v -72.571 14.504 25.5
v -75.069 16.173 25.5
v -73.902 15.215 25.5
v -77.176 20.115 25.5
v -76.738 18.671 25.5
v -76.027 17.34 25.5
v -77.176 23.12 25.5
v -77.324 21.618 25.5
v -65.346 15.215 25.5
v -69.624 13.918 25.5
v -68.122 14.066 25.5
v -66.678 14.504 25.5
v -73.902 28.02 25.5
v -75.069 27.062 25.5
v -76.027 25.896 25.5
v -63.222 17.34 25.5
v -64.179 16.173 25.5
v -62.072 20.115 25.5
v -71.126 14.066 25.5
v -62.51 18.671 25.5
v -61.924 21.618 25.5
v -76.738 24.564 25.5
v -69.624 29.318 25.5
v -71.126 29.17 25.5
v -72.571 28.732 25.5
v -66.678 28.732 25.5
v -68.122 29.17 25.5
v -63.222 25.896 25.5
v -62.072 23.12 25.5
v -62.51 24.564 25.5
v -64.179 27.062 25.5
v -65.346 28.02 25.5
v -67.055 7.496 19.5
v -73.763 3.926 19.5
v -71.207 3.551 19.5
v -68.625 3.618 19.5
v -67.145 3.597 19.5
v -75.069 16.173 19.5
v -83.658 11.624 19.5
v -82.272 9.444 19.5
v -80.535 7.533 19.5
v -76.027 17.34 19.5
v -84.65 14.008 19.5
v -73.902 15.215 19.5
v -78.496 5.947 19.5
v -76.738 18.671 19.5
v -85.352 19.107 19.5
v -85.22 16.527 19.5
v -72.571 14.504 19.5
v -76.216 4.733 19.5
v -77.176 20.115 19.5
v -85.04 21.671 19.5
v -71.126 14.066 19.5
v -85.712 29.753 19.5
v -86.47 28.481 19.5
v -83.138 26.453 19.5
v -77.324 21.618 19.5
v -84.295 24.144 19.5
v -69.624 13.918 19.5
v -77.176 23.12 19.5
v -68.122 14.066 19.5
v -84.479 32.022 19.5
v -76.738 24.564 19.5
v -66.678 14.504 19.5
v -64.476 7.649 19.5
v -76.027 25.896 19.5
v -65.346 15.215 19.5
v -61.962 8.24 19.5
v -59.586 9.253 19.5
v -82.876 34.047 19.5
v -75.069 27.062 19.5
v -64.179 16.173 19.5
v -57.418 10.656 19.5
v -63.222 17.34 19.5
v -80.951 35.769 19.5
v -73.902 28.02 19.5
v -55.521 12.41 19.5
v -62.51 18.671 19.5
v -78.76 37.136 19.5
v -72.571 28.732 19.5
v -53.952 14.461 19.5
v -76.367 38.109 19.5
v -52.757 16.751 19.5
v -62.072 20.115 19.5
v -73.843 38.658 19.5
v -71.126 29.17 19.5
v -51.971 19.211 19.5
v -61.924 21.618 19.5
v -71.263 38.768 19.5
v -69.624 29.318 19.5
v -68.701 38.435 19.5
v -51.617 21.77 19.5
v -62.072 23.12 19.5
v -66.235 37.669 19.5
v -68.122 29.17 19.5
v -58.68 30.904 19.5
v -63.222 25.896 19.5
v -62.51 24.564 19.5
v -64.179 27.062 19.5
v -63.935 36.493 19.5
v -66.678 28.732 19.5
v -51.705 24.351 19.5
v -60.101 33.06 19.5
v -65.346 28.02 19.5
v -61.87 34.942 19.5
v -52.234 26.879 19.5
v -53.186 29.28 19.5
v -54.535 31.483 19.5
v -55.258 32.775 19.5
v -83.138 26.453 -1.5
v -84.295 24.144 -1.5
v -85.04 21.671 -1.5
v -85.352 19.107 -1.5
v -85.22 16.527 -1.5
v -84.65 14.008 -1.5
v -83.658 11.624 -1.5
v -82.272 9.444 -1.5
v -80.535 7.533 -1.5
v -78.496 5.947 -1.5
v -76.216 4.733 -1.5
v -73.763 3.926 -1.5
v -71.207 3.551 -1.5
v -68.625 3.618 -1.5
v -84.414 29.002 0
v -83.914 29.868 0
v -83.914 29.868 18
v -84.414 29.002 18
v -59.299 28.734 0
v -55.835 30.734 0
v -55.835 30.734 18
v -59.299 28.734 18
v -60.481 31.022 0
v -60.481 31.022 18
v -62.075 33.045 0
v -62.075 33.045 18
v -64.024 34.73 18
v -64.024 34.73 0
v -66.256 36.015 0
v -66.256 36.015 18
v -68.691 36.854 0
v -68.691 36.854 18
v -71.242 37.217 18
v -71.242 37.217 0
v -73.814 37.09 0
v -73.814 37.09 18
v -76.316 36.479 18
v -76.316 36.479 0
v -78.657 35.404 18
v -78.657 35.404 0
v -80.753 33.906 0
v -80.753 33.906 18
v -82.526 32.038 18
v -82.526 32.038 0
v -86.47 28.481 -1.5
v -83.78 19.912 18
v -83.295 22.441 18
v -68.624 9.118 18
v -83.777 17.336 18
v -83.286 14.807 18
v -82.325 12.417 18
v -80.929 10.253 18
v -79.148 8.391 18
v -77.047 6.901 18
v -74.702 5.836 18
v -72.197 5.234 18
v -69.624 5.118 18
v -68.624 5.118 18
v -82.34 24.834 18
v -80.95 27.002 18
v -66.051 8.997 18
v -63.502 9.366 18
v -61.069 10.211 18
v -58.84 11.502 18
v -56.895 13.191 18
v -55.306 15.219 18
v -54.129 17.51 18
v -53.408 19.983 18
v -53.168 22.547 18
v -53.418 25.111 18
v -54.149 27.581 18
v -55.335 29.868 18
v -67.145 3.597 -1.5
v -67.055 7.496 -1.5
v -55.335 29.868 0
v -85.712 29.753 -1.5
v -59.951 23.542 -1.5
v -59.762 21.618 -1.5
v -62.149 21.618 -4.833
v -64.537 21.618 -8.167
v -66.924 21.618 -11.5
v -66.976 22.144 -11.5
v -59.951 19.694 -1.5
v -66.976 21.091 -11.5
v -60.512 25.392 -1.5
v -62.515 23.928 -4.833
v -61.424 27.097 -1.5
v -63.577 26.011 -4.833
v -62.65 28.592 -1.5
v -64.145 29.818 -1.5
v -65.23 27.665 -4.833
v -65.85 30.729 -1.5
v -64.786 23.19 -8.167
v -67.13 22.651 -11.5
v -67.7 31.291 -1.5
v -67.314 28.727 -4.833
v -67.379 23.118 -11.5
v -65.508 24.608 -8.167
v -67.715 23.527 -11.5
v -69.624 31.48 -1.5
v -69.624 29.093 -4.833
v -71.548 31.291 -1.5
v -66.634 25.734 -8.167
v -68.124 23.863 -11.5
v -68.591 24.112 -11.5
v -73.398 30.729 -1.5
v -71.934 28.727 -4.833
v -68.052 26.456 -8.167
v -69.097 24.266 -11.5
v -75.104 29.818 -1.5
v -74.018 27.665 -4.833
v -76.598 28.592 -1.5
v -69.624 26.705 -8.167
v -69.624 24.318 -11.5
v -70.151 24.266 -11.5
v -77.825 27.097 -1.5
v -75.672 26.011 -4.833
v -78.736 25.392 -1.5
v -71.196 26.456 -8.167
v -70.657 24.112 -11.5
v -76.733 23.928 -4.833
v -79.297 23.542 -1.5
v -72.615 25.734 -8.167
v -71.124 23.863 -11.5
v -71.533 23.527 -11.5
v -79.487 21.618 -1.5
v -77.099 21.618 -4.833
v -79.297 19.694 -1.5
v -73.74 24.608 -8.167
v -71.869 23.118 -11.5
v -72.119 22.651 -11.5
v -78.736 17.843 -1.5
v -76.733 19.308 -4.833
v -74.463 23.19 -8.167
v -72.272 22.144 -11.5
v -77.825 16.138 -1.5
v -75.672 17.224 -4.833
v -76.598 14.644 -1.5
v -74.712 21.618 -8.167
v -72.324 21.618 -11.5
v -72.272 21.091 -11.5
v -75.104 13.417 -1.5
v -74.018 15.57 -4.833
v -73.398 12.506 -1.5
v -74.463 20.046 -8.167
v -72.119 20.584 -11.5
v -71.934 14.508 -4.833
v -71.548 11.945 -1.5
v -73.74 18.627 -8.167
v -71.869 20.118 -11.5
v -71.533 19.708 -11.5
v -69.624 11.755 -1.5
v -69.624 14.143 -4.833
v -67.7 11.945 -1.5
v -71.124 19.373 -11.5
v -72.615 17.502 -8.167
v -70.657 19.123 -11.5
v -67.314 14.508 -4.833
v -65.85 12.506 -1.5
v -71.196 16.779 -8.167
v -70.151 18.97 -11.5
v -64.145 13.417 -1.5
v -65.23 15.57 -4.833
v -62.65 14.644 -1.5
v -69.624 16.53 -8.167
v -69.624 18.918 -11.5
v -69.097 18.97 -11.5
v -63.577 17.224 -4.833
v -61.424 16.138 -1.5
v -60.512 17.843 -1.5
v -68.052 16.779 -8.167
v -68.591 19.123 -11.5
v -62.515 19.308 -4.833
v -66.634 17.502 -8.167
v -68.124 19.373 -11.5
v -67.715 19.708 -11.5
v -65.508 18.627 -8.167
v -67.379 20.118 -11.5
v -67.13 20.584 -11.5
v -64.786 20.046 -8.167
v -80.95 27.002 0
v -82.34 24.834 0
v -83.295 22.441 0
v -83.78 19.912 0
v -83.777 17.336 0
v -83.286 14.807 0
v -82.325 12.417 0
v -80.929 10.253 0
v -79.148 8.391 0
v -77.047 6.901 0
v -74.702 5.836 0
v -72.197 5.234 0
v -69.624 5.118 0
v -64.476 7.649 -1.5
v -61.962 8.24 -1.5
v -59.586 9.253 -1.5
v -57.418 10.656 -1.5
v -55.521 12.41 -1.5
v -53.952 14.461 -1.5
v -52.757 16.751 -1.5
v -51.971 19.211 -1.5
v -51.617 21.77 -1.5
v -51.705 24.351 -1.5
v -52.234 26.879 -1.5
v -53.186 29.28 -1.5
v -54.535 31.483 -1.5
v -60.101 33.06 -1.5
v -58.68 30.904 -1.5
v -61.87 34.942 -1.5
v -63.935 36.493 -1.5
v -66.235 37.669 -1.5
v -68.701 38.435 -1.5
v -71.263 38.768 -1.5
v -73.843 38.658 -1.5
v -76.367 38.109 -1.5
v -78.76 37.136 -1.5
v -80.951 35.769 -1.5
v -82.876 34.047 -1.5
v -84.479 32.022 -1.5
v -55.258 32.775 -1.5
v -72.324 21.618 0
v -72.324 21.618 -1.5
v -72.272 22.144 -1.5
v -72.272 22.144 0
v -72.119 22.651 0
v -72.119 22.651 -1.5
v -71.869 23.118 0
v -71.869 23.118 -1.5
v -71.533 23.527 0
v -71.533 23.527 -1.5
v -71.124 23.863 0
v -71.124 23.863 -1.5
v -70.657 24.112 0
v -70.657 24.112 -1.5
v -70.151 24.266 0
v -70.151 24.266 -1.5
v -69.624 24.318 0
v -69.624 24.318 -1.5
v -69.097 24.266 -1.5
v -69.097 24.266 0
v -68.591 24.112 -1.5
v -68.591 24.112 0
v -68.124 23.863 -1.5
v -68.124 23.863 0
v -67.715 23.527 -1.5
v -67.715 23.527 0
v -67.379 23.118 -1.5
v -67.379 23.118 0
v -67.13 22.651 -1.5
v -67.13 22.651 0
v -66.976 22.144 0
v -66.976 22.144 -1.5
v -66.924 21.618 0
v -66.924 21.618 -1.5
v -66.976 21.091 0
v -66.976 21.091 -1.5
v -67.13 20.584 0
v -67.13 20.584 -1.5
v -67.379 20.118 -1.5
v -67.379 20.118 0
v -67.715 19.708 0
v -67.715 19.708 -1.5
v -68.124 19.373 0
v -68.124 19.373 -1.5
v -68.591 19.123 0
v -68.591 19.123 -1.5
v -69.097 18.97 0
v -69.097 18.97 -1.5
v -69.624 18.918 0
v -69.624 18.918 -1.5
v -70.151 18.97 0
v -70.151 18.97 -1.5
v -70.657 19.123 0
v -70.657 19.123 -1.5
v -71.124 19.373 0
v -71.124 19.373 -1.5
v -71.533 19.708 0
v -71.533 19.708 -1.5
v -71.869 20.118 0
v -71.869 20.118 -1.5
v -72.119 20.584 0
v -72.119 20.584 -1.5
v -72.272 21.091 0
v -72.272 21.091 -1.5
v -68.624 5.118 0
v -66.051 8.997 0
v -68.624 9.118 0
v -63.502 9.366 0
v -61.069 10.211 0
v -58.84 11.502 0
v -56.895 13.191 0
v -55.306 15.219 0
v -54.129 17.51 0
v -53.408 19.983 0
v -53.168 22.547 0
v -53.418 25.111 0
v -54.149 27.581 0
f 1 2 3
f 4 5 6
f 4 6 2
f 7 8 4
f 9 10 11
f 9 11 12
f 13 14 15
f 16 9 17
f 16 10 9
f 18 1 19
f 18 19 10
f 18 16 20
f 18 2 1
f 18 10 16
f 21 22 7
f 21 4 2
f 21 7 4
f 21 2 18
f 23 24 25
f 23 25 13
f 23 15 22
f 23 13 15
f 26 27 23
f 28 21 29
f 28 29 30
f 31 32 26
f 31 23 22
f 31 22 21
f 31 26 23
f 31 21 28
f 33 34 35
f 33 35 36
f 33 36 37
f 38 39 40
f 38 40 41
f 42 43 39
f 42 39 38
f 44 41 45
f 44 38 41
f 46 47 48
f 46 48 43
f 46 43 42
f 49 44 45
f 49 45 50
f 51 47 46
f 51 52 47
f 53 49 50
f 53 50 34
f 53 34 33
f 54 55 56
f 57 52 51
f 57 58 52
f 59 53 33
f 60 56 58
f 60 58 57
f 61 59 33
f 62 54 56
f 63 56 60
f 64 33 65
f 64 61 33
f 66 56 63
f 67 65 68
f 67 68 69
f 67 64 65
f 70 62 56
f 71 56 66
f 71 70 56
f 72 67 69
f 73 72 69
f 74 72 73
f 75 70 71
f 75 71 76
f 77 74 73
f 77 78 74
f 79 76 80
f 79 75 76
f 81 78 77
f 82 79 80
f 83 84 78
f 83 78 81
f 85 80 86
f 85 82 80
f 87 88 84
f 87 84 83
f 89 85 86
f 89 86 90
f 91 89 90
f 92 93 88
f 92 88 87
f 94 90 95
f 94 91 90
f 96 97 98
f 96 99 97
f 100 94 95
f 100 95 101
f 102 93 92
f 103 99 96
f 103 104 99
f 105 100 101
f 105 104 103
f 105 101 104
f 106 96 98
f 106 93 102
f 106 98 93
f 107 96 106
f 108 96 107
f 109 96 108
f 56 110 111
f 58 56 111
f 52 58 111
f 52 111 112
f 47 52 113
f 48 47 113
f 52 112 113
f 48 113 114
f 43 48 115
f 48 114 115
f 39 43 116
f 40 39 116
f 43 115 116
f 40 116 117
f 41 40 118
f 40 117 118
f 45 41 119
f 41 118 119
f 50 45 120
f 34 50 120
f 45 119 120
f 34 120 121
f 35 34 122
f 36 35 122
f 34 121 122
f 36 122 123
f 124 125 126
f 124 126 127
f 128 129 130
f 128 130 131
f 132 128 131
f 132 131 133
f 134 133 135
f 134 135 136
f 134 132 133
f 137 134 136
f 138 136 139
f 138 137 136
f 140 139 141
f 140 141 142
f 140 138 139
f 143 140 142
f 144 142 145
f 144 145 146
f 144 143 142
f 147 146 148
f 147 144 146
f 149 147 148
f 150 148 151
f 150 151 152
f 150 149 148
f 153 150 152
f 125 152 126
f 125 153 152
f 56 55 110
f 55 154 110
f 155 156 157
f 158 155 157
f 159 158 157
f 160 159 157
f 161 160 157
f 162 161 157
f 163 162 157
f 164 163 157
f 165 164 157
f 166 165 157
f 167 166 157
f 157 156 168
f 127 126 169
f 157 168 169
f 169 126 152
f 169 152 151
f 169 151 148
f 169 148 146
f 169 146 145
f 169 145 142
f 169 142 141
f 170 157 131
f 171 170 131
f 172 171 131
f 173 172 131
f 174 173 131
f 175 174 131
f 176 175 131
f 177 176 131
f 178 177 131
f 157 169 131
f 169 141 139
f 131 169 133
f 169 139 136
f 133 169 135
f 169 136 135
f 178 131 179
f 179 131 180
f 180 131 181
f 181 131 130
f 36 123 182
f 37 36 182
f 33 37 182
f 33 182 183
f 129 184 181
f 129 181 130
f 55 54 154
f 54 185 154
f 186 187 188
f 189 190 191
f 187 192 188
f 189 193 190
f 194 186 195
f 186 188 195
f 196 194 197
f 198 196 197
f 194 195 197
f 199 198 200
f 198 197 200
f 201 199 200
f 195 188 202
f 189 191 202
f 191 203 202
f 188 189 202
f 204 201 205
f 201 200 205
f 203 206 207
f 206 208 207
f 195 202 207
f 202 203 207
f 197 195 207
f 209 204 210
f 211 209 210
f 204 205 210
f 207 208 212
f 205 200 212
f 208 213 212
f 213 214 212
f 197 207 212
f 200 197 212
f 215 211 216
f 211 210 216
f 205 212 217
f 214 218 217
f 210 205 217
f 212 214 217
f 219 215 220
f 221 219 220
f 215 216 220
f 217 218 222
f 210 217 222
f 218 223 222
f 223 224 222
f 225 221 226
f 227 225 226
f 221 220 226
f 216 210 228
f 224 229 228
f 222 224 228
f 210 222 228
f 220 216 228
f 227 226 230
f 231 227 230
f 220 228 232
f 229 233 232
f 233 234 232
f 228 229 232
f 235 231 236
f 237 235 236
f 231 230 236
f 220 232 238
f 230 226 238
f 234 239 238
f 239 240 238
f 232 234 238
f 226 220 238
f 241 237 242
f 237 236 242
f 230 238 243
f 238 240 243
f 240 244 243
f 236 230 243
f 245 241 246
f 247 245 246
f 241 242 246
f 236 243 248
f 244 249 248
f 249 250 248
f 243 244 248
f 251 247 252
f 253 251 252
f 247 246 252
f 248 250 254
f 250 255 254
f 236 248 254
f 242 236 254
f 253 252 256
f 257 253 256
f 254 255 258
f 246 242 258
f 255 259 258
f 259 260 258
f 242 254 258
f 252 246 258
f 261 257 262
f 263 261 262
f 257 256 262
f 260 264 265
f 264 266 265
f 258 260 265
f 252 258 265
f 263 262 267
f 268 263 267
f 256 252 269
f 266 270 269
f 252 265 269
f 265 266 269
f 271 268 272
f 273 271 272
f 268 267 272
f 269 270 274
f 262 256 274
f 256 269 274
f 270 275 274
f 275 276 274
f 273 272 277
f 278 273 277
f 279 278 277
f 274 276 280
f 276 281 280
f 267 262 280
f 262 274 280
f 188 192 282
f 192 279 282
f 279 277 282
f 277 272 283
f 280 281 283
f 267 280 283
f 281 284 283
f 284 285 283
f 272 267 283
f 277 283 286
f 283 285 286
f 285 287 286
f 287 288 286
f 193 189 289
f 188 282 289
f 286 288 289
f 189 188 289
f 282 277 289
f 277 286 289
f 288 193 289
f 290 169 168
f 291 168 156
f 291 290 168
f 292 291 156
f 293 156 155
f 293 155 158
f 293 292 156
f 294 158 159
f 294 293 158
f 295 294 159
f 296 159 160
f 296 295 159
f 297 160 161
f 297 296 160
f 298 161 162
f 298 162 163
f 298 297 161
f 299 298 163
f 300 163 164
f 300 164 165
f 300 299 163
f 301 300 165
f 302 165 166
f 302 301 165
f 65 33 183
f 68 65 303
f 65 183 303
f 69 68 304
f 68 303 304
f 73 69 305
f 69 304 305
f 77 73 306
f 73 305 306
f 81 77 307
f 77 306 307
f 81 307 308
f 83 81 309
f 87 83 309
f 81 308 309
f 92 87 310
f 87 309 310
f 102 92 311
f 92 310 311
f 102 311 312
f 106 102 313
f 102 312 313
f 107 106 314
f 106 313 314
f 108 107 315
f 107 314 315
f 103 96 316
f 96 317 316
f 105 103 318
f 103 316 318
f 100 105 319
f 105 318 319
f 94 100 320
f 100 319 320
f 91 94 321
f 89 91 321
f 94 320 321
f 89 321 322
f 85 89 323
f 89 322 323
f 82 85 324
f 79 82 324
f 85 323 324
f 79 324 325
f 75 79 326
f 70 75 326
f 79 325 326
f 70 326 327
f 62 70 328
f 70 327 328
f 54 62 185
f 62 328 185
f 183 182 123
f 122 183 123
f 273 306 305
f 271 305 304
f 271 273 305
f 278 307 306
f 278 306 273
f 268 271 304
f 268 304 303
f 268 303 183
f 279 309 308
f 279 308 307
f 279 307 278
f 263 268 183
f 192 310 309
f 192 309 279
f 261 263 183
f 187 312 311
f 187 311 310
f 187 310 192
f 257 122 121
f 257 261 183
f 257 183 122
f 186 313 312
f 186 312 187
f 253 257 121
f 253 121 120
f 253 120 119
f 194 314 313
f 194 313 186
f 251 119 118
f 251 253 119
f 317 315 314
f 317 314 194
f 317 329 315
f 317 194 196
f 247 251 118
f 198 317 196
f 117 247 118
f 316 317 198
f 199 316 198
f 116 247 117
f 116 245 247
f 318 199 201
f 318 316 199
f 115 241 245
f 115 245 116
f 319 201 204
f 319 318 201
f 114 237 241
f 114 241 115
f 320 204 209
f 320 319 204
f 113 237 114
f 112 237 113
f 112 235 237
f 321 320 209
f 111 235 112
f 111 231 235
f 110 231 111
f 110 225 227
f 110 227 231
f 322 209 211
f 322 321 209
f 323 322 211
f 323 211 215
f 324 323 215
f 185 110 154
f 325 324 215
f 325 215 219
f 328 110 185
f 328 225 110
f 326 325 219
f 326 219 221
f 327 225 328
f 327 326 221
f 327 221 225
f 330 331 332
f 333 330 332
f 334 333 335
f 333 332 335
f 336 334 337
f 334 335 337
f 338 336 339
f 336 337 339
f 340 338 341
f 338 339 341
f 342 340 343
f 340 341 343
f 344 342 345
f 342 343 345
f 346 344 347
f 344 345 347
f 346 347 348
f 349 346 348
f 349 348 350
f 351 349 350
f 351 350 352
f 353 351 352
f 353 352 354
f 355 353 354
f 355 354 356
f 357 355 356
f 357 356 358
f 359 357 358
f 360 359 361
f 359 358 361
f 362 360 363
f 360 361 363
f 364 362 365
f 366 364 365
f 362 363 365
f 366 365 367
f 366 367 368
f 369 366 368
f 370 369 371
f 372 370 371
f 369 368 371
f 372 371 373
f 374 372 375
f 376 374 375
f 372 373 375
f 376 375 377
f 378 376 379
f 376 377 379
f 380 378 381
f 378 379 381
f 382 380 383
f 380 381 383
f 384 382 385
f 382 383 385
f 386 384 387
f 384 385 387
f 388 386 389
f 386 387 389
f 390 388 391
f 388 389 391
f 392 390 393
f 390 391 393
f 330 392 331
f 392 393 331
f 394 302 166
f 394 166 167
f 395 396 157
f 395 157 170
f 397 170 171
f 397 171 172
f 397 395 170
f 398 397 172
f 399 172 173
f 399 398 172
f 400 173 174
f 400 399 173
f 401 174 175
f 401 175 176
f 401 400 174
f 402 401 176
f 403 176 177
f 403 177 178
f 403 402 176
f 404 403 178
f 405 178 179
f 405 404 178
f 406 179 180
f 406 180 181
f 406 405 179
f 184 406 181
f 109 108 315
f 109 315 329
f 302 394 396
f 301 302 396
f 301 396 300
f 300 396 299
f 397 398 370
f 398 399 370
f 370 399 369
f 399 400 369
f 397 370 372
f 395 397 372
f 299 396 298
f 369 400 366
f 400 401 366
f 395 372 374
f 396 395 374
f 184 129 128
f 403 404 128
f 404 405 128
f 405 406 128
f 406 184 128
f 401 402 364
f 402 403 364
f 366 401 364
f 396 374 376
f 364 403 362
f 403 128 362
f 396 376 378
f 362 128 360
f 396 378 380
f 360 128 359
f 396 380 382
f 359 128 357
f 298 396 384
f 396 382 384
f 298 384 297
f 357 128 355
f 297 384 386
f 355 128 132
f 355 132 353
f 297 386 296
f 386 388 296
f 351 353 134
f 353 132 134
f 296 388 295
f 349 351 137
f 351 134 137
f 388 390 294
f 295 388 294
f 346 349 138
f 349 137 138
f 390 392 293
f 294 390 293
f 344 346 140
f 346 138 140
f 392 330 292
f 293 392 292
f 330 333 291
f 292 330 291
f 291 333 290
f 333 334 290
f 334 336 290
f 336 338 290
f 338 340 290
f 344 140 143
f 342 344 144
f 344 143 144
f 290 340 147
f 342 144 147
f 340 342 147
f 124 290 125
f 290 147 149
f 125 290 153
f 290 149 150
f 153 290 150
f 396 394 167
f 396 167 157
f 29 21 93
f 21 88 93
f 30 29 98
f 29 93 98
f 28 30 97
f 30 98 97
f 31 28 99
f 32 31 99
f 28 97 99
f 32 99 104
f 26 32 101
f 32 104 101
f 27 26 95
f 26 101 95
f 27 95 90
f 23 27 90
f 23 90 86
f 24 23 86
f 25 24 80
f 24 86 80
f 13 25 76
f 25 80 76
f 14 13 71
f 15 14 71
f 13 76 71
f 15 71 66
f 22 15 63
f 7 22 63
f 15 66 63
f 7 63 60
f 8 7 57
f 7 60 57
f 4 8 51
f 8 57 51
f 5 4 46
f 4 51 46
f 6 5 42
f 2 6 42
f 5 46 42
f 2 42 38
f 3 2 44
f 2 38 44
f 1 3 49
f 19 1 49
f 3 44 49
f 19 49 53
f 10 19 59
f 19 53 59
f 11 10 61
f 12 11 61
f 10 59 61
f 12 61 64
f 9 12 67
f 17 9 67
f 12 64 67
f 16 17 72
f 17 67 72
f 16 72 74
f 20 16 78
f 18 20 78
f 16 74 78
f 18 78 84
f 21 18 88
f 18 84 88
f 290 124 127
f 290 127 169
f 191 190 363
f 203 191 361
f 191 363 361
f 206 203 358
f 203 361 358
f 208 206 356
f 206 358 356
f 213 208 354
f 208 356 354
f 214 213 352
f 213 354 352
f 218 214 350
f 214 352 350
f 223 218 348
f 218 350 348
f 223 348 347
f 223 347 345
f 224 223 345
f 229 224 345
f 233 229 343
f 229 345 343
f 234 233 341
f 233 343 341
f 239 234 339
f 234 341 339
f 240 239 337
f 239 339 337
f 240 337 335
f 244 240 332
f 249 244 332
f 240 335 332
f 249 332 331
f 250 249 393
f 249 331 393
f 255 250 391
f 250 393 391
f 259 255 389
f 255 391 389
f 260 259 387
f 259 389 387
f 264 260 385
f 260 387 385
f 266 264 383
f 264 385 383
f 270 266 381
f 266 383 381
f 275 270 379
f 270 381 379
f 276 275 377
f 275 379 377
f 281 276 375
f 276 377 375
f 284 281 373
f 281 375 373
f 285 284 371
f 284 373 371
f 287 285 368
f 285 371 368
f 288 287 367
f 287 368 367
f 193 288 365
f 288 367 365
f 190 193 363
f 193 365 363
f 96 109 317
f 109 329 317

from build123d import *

# Parameters (mm, degrees)
SALIENTE_EXTRUIR1_DEPTH = 18
SALIENTE_EXTRUIR2_START = 1.5
CROQUIS2_R              = 2.7
SALIENTE_EXTRUIR2_DEPTH = 1.5
SALIENTE_EXTRUIR3_DEPTH = 1.5
CROQUIS6_W              = 5.4
CROQUIS6_H              = 1.181933233
SALIENTE_EXTRUIR7_DEPTH = 10
CROQUIS7_W              = 5.4
CROQUIS7_H              = 10
CORTAR_EXTRUIR2_DEPTH   = 16.5


with BuildPart() as part:
    # Croquis1 → Saliente-Extruir1 (new body)
    with BuildSketch(Plane.XY):
        with BuildLine():
            Line((-54.535099114, 31.482780649), (-55.25791247, 32.775048384))
            Line((-55.25791247, 32.775048384), (-58.679569293, 30.903614553))
            ThreePointArc((-58.679569293, 30.903614553), (-72.555259572, 38.768368337), (-85.712228427, 29.752642999))
            Line((-85.712228427, 29.752642999), (-86.469958437, 28.480534403))
            Line((-86.469958437, 28.480534403), (-83.138420786, 26.453009587))
            ThreePointArc((-83.138420786, 26.453009587), (-83.011652218, 10.503932418), (-68.625320614, 3.617525822))
            Line((-68.625320614, 3.617525822), (-67.144777249, 3.597366682))
            Line((-67.144777249, 3.597366682), (-67.054658077, 7.49632533))
            ThreePointArc((-67.054658077, 7.49632533), (-53.305736365, 15.580648714), (-54.535099114, 31.482780649))
        make_face()
        with BuildLine():
            Line((-69.624216052, 5.117649823), (-68.624216052, 5.117649823))
            Line((-68.624216052, 5.117649823), (-68.624216052, 9.117649823))
            ThreePointArc((-68.624216052, 9.117649823), (-55.305921191, 15.218525867), (-55.334796889, 29.867649823))
            Line((-55.334796889, 29.867649823), (-55.834796889, 30.733675227))
            Line((-55.834796889, 30.733675227), (-59.298898504, 28.733675227))
            ThreePointArc((-59.298898504, 28.733675227), (-71.241559574, 37.21721889), (-83.913635214, 29.867649823))
            Line((-83.913635214, 29.867649823), (-84.413635214, 29.001624419))
            Line((-84.413635214, 29.001624419), (-80.949533599, 27.001624419))
            ThreePointArc((-80.949533599, 27.001624419), (-82.325167391, 12.417204713), (-69.624216052, 5.117649823))
        make_face(mode=Mode.SUBTRACT)
    extrude(amount=SALIENTE_EXTRUIR1_DEPTH)

    # Croquis2 → Saliente-Extruir2 (add)
    with BuildSketch(Plane(origin=(0, 0, 0), x_dir=(-1, 0, 0), z_dir=(0, 0, -1)).offset(SALIENTE_EXTRUIR2_START)):
        with BuildLine():
            Line((67.054658077, 7.49632533), (67.144777249, 3.597366682))
            Line((67.144777249, 3.597366682), (68.625320614, 3.617525822))
            ThreePointArc((68.625320614, 3.617525822), (83.011652218, 10.503932418), (83.138420786, 26.453009587))
            Line((83.138420786, 26.453009587), (86.469958437, 28.480534403))
            Line((86.469958437, 28.480534403), (85.712228427, 29.752642999))
            ThreePointArc((85.712228427, 29.752642999), (72.555259572, 38.768368337), (58.679569293, 30.903614553))
            Line((58.679569293, 30.903614553), (55.25791247, 32.775048384))
            Line((55.25791247, 32.775048384), (54.535099114, 31.482780649))
            ThreePointArc((54.535099114, 31.482780649), (53.305736365, 15.580648714), (67.054658077, 7.49632533))
        make_face()
        with Locations((69.624216052, 21.617649823)):
            Circle(CROQUIS2_R, mode=Mode.SUBTRACT)
    extrude(amount=-SALIENTE_EXTRUIR2_DEPTH)

    # Croquis3 → Saliente-Extruir3 (add)
    with BuildSketch(Plane.XY.offset(18)):
        with BuildLine():
            Line((-67.144777249, 3.597366682), (-67.054658077, 7.49632533))
            ThreePointArc((-67.054658077, 7.49632533), (-53.305736365, 15.580648714), (-54.535099114, 31.482780649))
            Line((-54.535099114, 31.482780649), (-55.25791247, 32.775048384))
            Line((-55.25791247, 32.775048384), (-58.679569293, 30.903614553))
            ThreePointArc((-58.679569293, 30.903614553), (-72.555259572, 38.768368337), (-85.712228427, 29.752642999))
            Line((-85.712228427, 29.752642999), (-86.469958437, 28.480534403))
            Line((-86.469958437, 28.480534403), (-83.138420786, 26.453009587))
            ThreePointArc((-83.138420786, 26.453009587), (-83.011652218, 10.503932418), (-68.625320614, 3.617525822))
            Line((-68.625320614, 3.617525822), (-67.144777249, 3.597366682))
        make_face()
    extrude(amount=SALIENTE_EXTRUIR3_DEPTH)

    # Croquis6 → Saliente-Extruir7 (add)
    with BuildSketch(Plane(origin=(0, 0, -1.5), x_dir=(-1, 0, 0), z_dir=(0, 0, -1))):
        with Locations((69.624216052, 21.026683207)):
            Rectangle(CROQUIS6_W, CROQUIS6_H)
    extrude(amount=SALIENTE_EXTRUIR7_DEPTH)

    # Croquis7 → Cortar-Extruir2 (cut)
    with BuildSketch(Plane(origin=(0, 21.617649823, 0), x_dir=(1, 0, 0), z_dir=(0, 1, 0))):
        with Locations((-69.624216052, 6.5)):
            Rectangle(CROQUIS7_W, CROQUIS7_H)
    extrude(amount=-CORTAR_EXTRUIR2_DEPTH, mode=Mode.SUBTRACT)

    # Croquis8 → Revolución1 (revolve)
    with BuildSketch(Plane(origin=(0, 21.617649823, 0), x_dir=(1, 0, 0), z_dir=(0, 1, 0)), mode=Mode.PRIVATE) as revoluci_n1_sk:
        Polygon((-72.324216052, 1.5), (-79.486781688, 1.5), (-72.324216052, 11.5), align=None)
        Polygon((-72.324216052, -19.5), (-69.624216052, -19.5), (-69.624216052, -25.5), (-72.324216052, -25.5), (-77.324216052, -25.5), (-77.324216052, -19.5), align=None)
    revolve(revoluci_n1_sk.sketch.rotate(Axis((-69.624216052, 21.617649823, 19.5), (0, 0, 1)), 180), axis=Axis((-69.624216052, 21.617649823, 19.5), (0, 0, 1)))


solid = part.part
